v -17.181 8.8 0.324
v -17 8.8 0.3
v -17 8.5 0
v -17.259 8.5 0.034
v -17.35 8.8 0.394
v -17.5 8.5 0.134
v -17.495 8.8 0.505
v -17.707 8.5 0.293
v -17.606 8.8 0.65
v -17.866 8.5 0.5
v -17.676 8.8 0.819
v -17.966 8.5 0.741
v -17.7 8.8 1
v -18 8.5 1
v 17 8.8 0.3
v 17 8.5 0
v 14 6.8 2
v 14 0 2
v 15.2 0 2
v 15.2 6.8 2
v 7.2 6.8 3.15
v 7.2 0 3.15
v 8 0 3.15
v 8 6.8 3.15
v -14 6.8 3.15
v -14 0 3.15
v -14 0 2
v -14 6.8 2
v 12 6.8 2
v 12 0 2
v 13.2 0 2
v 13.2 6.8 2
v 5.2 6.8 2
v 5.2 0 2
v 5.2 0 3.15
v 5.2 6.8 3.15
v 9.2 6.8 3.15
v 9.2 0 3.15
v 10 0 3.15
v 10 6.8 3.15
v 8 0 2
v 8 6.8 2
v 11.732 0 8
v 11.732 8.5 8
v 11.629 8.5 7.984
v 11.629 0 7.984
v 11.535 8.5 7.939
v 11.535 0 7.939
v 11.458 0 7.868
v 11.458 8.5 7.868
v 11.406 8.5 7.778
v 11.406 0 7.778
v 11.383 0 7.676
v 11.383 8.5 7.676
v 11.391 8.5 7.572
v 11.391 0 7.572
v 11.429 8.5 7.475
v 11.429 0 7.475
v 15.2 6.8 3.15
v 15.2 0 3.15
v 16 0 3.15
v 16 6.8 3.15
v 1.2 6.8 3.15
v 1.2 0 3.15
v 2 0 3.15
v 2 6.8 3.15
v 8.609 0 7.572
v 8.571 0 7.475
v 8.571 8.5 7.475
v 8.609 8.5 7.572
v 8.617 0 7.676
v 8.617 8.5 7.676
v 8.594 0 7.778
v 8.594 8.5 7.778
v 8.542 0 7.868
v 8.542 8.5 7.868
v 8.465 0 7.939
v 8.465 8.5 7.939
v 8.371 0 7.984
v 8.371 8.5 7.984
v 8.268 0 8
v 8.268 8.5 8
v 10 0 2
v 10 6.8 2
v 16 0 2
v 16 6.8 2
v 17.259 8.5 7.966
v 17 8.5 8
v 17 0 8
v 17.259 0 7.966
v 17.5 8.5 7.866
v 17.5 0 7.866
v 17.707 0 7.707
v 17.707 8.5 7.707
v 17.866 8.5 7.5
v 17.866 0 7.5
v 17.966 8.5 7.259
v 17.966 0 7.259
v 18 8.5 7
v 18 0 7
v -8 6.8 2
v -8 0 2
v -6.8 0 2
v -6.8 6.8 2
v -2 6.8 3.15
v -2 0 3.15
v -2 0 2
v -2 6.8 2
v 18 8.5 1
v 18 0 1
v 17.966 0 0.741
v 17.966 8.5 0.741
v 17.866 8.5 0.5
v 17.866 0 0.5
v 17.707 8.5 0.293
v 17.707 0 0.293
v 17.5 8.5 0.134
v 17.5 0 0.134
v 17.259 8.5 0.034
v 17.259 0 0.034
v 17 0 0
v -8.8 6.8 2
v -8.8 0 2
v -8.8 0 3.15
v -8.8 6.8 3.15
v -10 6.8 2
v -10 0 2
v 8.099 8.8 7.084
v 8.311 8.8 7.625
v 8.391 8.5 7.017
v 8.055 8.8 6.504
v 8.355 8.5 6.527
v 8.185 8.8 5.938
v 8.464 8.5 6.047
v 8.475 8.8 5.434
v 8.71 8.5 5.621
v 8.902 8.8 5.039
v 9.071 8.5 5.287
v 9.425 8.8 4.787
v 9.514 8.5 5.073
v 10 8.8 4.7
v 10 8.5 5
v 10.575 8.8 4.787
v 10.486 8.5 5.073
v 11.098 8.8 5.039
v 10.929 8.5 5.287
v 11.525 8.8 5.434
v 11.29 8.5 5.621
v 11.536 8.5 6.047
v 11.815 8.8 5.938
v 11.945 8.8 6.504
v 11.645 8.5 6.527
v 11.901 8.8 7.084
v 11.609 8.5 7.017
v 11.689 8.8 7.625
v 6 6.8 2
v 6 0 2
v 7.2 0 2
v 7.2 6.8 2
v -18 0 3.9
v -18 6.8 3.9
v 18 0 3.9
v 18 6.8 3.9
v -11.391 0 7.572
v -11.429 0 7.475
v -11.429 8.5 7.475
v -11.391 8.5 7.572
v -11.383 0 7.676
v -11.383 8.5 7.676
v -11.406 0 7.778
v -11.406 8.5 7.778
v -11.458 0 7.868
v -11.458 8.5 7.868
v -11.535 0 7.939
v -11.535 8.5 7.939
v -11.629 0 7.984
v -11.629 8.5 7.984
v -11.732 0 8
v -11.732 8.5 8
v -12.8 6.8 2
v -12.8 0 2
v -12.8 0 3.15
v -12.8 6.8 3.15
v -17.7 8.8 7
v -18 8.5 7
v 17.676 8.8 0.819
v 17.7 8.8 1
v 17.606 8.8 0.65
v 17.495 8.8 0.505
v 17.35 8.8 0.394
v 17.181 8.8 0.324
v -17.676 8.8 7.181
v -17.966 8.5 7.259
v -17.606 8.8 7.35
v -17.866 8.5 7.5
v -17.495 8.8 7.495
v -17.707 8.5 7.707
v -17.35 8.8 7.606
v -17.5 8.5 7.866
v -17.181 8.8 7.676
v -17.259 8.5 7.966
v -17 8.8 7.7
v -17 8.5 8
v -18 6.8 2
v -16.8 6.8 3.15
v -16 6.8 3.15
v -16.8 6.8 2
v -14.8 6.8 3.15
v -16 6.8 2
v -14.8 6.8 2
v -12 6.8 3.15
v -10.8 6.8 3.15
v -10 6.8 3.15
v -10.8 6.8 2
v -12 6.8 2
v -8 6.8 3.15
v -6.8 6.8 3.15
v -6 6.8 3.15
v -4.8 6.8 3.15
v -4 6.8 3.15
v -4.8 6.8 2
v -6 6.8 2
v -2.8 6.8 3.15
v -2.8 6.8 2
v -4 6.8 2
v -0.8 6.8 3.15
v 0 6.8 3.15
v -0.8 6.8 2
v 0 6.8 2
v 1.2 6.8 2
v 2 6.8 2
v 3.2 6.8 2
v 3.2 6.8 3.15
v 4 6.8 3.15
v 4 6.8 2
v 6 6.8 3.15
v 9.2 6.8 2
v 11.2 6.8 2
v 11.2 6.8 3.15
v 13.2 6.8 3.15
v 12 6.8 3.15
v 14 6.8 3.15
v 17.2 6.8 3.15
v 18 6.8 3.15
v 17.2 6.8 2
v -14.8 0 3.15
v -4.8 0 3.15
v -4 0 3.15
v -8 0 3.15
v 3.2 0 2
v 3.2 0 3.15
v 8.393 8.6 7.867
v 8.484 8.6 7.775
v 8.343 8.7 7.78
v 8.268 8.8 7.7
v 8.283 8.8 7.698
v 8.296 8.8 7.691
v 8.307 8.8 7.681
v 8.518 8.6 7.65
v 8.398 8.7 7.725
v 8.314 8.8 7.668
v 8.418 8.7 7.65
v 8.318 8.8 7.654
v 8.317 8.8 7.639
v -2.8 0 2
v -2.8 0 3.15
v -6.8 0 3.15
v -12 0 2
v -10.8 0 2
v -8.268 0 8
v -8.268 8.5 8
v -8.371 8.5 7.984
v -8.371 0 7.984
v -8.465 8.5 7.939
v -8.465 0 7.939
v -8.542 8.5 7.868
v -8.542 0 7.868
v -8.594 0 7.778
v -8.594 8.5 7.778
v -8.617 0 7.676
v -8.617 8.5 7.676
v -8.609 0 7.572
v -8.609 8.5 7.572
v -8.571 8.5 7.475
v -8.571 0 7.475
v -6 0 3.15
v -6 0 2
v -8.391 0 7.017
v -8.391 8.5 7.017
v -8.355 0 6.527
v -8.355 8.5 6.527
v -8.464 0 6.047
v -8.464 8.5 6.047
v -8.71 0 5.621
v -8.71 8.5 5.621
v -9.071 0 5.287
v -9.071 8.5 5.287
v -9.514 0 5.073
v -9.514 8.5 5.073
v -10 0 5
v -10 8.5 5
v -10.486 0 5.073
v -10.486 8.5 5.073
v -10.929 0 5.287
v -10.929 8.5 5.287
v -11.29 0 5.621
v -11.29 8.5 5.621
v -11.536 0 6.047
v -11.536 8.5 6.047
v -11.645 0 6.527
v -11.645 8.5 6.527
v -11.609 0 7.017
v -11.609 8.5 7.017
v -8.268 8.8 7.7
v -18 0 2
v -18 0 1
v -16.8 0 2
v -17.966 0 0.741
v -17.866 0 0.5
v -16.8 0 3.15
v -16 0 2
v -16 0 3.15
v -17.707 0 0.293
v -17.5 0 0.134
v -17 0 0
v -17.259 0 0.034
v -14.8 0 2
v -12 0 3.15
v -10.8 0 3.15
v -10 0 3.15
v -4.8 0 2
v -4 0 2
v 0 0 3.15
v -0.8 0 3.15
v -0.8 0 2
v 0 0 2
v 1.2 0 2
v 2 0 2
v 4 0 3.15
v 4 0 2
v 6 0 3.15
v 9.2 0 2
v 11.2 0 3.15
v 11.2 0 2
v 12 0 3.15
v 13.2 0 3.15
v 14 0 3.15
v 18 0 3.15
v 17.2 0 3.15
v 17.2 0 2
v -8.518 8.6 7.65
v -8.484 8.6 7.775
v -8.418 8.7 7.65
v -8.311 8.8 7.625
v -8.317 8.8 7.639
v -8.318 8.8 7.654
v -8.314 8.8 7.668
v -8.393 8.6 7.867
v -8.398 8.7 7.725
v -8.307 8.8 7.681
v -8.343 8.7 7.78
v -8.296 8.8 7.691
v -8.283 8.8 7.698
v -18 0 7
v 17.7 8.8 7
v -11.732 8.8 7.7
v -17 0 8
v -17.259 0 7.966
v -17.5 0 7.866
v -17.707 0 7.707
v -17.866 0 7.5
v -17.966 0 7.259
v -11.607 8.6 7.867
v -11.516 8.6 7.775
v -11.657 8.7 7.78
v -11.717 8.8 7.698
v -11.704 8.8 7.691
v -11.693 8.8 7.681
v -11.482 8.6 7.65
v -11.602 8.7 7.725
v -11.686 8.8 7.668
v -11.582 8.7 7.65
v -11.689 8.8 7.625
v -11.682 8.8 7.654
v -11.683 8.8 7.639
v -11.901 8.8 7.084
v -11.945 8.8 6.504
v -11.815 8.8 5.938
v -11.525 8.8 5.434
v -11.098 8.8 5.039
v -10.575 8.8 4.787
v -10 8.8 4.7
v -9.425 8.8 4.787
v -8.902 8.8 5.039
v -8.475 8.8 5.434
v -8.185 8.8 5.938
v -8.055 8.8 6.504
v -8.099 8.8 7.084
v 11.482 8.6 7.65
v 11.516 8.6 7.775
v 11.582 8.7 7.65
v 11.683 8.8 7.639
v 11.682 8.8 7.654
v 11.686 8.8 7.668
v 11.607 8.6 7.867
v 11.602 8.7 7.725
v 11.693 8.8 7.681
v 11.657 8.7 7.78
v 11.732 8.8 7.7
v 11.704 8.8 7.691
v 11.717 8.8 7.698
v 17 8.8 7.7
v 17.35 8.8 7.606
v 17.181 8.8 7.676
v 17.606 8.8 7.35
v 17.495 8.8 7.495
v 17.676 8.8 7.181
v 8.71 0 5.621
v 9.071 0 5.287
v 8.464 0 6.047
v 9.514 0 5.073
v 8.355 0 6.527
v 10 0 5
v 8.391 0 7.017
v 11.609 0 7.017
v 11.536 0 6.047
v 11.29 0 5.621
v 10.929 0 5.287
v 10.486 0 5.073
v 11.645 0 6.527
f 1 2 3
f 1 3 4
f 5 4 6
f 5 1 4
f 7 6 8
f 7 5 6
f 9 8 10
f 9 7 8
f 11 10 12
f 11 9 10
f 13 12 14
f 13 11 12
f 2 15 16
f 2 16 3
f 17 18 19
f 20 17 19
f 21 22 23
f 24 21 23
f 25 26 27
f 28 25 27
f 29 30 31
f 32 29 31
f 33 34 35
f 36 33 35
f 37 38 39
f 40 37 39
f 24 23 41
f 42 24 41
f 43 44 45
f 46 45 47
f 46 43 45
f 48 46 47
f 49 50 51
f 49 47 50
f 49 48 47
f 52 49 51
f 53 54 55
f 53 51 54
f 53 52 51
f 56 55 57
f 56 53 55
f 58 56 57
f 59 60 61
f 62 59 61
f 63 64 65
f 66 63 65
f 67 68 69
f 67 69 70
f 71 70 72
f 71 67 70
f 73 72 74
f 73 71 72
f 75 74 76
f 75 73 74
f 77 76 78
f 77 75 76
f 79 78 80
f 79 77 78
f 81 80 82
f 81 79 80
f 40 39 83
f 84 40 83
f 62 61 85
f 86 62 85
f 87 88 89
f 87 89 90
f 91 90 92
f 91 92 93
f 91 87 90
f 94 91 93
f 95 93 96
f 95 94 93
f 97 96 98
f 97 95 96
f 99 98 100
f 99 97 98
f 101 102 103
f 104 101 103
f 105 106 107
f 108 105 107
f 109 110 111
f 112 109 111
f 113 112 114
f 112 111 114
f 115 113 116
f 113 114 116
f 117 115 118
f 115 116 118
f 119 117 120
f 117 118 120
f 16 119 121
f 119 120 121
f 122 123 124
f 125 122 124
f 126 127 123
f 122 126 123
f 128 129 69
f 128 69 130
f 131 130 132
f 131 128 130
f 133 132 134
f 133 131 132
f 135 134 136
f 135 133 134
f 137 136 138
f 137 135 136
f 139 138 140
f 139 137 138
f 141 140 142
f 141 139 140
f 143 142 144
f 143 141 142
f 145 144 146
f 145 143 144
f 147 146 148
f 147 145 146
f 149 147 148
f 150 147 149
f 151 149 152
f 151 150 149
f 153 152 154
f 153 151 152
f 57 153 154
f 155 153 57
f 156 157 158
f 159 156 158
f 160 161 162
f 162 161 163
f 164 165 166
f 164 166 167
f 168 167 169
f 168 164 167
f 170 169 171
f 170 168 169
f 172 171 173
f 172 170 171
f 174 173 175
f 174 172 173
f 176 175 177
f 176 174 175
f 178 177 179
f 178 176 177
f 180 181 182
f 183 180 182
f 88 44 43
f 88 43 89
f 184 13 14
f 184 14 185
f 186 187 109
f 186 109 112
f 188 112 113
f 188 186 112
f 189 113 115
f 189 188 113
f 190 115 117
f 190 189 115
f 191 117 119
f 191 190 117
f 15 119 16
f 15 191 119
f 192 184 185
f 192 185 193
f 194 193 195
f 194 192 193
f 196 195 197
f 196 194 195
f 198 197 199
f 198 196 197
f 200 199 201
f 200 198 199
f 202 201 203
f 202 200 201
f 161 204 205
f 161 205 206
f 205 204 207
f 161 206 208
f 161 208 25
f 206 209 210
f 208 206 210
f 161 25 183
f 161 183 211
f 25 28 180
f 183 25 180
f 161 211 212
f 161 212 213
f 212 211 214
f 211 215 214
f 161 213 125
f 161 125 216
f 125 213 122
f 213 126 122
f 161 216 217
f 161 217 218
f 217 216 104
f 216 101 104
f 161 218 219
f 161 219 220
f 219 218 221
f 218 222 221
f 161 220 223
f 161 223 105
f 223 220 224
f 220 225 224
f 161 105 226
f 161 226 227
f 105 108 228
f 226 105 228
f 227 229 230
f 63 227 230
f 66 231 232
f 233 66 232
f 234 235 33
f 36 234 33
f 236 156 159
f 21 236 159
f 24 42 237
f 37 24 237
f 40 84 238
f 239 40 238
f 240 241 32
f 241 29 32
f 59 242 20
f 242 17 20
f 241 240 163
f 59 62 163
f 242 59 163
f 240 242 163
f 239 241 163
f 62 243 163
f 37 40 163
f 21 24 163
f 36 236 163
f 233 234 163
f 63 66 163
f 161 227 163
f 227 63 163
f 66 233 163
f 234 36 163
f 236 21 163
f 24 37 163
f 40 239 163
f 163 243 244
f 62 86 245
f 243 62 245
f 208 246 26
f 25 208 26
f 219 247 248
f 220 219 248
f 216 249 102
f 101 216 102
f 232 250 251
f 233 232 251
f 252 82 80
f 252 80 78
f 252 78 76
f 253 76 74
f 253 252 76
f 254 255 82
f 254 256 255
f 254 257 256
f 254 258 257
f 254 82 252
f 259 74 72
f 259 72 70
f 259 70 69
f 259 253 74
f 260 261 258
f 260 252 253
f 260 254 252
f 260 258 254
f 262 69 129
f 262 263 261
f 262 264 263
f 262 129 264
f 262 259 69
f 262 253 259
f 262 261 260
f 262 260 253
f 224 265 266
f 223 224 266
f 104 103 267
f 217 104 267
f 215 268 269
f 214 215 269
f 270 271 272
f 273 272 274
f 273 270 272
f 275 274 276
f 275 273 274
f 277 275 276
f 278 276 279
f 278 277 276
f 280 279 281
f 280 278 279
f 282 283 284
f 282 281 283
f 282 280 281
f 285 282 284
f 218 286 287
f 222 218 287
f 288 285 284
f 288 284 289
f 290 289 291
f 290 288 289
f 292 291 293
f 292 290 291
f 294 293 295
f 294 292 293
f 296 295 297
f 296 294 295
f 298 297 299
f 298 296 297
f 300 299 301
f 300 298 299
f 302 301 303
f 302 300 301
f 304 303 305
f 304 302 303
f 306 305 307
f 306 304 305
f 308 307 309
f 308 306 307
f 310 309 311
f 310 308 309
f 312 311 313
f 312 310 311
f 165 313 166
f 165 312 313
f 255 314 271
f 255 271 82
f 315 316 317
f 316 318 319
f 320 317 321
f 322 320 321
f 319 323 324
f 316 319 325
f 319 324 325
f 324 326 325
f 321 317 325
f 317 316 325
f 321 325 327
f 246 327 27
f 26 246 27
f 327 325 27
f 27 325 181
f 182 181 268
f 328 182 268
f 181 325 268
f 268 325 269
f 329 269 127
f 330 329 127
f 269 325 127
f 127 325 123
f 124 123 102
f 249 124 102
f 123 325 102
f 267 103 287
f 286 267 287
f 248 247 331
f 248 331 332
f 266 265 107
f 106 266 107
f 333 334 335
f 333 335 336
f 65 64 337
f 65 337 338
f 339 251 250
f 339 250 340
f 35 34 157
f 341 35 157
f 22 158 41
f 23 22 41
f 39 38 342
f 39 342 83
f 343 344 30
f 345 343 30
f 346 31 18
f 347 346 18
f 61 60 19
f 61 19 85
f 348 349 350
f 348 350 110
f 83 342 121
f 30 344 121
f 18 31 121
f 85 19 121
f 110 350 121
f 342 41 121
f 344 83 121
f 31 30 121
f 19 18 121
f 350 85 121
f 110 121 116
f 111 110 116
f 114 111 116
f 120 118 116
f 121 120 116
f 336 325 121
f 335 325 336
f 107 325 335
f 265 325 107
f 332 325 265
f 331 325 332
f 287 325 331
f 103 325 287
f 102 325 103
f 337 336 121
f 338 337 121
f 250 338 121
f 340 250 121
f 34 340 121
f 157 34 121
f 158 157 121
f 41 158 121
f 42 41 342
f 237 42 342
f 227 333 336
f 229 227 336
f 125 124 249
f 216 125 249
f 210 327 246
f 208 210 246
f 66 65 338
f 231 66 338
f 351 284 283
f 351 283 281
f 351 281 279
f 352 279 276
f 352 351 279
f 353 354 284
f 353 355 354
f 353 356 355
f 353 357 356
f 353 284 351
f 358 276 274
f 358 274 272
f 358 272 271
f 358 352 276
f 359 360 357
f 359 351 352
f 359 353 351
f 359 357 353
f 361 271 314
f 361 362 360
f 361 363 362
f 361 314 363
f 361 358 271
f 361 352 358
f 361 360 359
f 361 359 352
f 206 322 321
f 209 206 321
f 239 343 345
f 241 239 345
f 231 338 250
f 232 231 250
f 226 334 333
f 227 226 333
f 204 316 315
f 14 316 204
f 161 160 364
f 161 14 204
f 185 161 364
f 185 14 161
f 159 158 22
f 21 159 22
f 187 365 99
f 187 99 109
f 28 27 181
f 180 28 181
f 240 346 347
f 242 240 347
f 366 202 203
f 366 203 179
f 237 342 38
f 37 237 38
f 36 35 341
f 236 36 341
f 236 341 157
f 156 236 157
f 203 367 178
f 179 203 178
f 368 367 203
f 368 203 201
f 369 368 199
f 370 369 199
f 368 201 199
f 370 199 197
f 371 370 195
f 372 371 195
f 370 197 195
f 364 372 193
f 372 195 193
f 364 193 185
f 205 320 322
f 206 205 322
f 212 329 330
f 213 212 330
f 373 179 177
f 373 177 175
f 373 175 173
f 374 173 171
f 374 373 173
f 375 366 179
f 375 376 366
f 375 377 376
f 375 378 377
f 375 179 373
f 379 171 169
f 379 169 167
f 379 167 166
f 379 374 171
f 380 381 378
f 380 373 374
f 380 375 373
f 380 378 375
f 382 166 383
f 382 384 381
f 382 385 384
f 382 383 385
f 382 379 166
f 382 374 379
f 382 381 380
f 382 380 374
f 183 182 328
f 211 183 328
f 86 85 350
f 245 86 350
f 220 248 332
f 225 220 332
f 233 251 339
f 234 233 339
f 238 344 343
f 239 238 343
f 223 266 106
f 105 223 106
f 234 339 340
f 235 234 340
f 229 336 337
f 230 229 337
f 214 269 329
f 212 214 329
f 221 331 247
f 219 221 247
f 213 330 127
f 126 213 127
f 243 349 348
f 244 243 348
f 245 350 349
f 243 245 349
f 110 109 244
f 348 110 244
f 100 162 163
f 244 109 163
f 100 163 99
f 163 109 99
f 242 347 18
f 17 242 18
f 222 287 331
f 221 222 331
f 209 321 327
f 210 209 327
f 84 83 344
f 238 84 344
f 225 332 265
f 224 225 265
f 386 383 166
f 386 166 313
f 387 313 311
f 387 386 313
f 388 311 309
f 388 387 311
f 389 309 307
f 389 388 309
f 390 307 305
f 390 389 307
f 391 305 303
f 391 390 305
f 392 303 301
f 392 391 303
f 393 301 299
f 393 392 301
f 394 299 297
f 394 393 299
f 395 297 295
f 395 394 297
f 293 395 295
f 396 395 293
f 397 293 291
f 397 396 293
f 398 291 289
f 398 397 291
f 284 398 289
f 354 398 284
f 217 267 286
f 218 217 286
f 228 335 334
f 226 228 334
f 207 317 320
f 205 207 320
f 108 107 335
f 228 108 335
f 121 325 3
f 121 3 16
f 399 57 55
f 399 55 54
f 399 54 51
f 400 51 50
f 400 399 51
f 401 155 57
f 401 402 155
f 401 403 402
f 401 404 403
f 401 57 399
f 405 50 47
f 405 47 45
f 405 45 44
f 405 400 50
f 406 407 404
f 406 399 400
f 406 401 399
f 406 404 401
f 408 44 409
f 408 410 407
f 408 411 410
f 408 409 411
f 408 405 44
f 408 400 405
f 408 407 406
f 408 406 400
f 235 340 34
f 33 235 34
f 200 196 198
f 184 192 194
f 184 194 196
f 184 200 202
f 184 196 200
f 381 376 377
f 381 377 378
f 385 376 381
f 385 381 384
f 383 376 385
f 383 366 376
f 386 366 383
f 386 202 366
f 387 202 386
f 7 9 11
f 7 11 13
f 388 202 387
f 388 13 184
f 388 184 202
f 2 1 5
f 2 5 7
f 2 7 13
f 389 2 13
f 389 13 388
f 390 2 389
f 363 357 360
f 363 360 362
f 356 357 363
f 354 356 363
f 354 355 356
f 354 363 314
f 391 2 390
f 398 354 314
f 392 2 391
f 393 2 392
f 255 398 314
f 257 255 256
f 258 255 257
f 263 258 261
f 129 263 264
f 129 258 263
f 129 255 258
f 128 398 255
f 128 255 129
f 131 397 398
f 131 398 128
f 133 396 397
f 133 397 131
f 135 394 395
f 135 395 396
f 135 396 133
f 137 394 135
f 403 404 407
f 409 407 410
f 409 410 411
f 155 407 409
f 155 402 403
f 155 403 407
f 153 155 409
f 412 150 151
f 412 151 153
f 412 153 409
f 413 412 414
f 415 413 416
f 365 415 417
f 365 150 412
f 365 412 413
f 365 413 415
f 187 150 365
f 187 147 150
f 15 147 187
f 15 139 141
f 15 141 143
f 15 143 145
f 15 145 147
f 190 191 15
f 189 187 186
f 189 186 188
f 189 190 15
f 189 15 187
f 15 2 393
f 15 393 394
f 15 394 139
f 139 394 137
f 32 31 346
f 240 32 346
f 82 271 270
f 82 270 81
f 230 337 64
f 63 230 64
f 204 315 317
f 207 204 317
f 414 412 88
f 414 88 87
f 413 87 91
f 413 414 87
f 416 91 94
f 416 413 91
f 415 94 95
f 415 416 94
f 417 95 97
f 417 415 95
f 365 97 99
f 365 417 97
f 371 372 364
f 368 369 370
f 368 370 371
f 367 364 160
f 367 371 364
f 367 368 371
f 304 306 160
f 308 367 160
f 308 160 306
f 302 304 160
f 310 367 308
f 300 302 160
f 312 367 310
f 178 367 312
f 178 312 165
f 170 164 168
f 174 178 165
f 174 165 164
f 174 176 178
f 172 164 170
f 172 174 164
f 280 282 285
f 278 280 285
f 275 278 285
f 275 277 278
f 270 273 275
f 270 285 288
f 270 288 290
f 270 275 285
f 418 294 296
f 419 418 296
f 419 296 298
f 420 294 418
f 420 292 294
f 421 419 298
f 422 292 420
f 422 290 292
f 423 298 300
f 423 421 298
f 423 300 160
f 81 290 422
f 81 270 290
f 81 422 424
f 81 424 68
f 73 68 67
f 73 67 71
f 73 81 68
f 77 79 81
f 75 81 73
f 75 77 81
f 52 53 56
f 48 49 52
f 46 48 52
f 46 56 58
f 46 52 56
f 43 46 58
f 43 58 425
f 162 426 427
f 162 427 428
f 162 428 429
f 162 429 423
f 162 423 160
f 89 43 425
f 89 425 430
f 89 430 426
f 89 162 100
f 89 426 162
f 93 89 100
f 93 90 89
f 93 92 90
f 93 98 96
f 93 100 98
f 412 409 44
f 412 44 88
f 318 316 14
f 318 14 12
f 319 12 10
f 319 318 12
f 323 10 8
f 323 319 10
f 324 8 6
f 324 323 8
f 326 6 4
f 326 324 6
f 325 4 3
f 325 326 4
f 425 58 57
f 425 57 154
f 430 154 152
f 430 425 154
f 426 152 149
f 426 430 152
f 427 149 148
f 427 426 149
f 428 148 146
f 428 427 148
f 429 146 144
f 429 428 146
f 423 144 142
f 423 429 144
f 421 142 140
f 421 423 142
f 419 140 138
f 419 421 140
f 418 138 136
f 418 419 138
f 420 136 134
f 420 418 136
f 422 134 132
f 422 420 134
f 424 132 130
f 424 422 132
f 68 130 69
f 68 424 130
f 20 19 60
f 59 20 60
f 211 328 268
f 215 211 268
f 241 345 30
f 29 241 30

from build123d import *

# Parameters (mm, degrees)
BOSS_EXTRUDE1_DEPTH     = 6.8
SKETCH4_W               = 36
SKETCH4_H               = 8
BOSS_EXTRUDE2_DEPTH     = 2
SKETCH5_W               = 36
SKETCH5_H               = 4.1
BOSS_EXTRUDE3_DEPTH     = 6.8
CUT_EXTRUDE1_DEPTH      = 22.574058496
CUT_EXTRUDE1_DEPTH_BACK = 22.574058496
SKETCH6_R               = 1.65
FILLET3_R               = 0.35
FILLET4_R               = 1
CHAMFER1_SIZE           = 0.3


with BuildPart() as part:
    # Sketch1 → Boss-Extrude1 (new body)
    with BuildSketch(Plane(origin=(0, 0, 0), x_dir=(1, 0, 0), z_dir=(0, 1, 0))):
        Polygon((0, 0), (-18, 0), (-18, -2), (-16.8, -2), (-16.8, -3.15), (-16, -3.15), (-16, -2), (-14.8, -2), (-14.8, -3.15), (-14, -3.15), (-14, -2), (-12.8, -2), (-12.8, -3.15), (-12, -3.15), (-12, -2), (-10.8, -2), (-10.8, -3.15), (-10, -3.15), (-10, -2), (-8.8, -2), (-8.8, -3.15), (-8, -3.15), (-8, -2), (-6.8, -2), (-6.8, -3.15), (-6, -3.15), (-6, -2), (-4.8, -2), (-4.8, -3.15), (-4, -3.15), (-4, -2), (-2.8, -2), (-2.8, -3.15), (-2, -3.15), (-2, -2), (-0.8, -2), (-0.8, -3.15), (0, -3.15), (0, -2), (1.2, -2), (1.2, -3.15), (2, -3.15), (2, -2), (3.2, -2), (3.2, -3.15), (4, -3.15), (4, -2), (5.2, -2), (5.2, -3.15), (6, -3.15), (6, -2), (7.2, -2), (7.2, -3.15), (8, -3.15), (8, -2), (9.2, -2), (9.2, -3.15), (10, -3.15), (10, -2), (11.2, -2), (11.2, -3.15), (12, -3.15), (12, -2), (13.2, -2), (13.2, -3.15), (14, -3.15), (14, -2), (15.2, -2), (15.2, -3.15), (16, -3.15), (16, -2), (17.2, -2), (17.2, -3.15), (18, -3.15), (18, -2), (18, 0), align=None)
    extrude(amount=BOSS_EXTRUDE1_DEPTH)

    # Sketch4 → Boss-Extrude2 (add)
    with BuildSketch(Plane(origin=(0, 6.8, 0), x_dir=(1, 0, 0), z_dir=(0, 1, 0))):
        with Locations((0, -4)):
            Rectangle(SKETCH4_W, SKETCH4_H)
    extrude(amount=BOSS_EXTRUDE2_DEPTH)

    # Sketch5 → Boss-Extrude3 (add)
    with BuildSketch(Plane.XZ.offset(-6.8)):
        with Locations((0, 5.95)):
            Rectangle(SKETCH5_W, SKETCH5_H)
    extrude(amount=BOSS_EXTRUDE3_DEPTH)

    # Sketch6 → Cut-Extrude1 (cut, two sides: drawn at the far end of the back side and taken through both)
    with BuildSketch(Plane(origin=(0, 8.8, 0), x_dir=(1, 0, 0), z_dir=(0, 1, 0)).offset(-CUT_EXTRUDE1_DEPTH_BACK)):
        with Locations((-10, -6.65)):
            Circle(SKETCH6_R)
        with Locations((10, -6.65)):
            Circle(SKETCH6_R)
    extrude(amount=CUT_EXTRUDE1_DEPTH + CUT_EXTRUDE1_DEPTH_BACK, mode=Mode.SUBTRACT)

    # Fillet3
    fillet3_edges = [part.edges().sort_by_distance(p)[0] for p in [
        (9.051316702, 4.4, 8),
        (10.948683298, 4.4, 8),
        (-10.948683298, 4.4, 8),
        (-9.051316702, 4.4, 8),
    ]]
    fillet(fillet3_edges, radius=FILLET3_R)

    # Fillet4
    fillet4_edges = [part.edges().sort_by_distance(p)[0] for p in [
        (18, 4.4, 0),
        (-18, 4.4, 0),
        (-18, 4.4, 8),
        (18, 4.4, 8),
    ]]
    fillet(fillet4_edges, radius=FILLET4_R)

    # Chamfer1
    chamfer1_edges = [part.edges().sort_by_distance(p)[0] for p in [
        (14.366025404, 8.8, 8),
        (10, 8.8, 5),
        (-10, 8.8, 5),
        (0, 8.8, 8),
        (-11.428941916, 8.8, 7.825),
        (-8.571058084, 8.8, 7.825),
        (8.571058084, 8.8, 7.825),
        (11.428941916, 8.8, 7.825),
        (-14.366025404, 8.8, 8),
        (-18, 8.8, 4),
        (18, 8.8, 4),
        (0, 8.8, 0),
        (-17.707106781, 8.8, 0.292893219),
        (17.707106781, 8.8, 0.292893219),
        (17.707106781, 8.8, 7.707106781),
        (-17.707106781, 8.8, 7.707106781),
    ]]
    chamfer(chamfer1_edges, length=CHAMFER1_SIZE)


solid = part.part
